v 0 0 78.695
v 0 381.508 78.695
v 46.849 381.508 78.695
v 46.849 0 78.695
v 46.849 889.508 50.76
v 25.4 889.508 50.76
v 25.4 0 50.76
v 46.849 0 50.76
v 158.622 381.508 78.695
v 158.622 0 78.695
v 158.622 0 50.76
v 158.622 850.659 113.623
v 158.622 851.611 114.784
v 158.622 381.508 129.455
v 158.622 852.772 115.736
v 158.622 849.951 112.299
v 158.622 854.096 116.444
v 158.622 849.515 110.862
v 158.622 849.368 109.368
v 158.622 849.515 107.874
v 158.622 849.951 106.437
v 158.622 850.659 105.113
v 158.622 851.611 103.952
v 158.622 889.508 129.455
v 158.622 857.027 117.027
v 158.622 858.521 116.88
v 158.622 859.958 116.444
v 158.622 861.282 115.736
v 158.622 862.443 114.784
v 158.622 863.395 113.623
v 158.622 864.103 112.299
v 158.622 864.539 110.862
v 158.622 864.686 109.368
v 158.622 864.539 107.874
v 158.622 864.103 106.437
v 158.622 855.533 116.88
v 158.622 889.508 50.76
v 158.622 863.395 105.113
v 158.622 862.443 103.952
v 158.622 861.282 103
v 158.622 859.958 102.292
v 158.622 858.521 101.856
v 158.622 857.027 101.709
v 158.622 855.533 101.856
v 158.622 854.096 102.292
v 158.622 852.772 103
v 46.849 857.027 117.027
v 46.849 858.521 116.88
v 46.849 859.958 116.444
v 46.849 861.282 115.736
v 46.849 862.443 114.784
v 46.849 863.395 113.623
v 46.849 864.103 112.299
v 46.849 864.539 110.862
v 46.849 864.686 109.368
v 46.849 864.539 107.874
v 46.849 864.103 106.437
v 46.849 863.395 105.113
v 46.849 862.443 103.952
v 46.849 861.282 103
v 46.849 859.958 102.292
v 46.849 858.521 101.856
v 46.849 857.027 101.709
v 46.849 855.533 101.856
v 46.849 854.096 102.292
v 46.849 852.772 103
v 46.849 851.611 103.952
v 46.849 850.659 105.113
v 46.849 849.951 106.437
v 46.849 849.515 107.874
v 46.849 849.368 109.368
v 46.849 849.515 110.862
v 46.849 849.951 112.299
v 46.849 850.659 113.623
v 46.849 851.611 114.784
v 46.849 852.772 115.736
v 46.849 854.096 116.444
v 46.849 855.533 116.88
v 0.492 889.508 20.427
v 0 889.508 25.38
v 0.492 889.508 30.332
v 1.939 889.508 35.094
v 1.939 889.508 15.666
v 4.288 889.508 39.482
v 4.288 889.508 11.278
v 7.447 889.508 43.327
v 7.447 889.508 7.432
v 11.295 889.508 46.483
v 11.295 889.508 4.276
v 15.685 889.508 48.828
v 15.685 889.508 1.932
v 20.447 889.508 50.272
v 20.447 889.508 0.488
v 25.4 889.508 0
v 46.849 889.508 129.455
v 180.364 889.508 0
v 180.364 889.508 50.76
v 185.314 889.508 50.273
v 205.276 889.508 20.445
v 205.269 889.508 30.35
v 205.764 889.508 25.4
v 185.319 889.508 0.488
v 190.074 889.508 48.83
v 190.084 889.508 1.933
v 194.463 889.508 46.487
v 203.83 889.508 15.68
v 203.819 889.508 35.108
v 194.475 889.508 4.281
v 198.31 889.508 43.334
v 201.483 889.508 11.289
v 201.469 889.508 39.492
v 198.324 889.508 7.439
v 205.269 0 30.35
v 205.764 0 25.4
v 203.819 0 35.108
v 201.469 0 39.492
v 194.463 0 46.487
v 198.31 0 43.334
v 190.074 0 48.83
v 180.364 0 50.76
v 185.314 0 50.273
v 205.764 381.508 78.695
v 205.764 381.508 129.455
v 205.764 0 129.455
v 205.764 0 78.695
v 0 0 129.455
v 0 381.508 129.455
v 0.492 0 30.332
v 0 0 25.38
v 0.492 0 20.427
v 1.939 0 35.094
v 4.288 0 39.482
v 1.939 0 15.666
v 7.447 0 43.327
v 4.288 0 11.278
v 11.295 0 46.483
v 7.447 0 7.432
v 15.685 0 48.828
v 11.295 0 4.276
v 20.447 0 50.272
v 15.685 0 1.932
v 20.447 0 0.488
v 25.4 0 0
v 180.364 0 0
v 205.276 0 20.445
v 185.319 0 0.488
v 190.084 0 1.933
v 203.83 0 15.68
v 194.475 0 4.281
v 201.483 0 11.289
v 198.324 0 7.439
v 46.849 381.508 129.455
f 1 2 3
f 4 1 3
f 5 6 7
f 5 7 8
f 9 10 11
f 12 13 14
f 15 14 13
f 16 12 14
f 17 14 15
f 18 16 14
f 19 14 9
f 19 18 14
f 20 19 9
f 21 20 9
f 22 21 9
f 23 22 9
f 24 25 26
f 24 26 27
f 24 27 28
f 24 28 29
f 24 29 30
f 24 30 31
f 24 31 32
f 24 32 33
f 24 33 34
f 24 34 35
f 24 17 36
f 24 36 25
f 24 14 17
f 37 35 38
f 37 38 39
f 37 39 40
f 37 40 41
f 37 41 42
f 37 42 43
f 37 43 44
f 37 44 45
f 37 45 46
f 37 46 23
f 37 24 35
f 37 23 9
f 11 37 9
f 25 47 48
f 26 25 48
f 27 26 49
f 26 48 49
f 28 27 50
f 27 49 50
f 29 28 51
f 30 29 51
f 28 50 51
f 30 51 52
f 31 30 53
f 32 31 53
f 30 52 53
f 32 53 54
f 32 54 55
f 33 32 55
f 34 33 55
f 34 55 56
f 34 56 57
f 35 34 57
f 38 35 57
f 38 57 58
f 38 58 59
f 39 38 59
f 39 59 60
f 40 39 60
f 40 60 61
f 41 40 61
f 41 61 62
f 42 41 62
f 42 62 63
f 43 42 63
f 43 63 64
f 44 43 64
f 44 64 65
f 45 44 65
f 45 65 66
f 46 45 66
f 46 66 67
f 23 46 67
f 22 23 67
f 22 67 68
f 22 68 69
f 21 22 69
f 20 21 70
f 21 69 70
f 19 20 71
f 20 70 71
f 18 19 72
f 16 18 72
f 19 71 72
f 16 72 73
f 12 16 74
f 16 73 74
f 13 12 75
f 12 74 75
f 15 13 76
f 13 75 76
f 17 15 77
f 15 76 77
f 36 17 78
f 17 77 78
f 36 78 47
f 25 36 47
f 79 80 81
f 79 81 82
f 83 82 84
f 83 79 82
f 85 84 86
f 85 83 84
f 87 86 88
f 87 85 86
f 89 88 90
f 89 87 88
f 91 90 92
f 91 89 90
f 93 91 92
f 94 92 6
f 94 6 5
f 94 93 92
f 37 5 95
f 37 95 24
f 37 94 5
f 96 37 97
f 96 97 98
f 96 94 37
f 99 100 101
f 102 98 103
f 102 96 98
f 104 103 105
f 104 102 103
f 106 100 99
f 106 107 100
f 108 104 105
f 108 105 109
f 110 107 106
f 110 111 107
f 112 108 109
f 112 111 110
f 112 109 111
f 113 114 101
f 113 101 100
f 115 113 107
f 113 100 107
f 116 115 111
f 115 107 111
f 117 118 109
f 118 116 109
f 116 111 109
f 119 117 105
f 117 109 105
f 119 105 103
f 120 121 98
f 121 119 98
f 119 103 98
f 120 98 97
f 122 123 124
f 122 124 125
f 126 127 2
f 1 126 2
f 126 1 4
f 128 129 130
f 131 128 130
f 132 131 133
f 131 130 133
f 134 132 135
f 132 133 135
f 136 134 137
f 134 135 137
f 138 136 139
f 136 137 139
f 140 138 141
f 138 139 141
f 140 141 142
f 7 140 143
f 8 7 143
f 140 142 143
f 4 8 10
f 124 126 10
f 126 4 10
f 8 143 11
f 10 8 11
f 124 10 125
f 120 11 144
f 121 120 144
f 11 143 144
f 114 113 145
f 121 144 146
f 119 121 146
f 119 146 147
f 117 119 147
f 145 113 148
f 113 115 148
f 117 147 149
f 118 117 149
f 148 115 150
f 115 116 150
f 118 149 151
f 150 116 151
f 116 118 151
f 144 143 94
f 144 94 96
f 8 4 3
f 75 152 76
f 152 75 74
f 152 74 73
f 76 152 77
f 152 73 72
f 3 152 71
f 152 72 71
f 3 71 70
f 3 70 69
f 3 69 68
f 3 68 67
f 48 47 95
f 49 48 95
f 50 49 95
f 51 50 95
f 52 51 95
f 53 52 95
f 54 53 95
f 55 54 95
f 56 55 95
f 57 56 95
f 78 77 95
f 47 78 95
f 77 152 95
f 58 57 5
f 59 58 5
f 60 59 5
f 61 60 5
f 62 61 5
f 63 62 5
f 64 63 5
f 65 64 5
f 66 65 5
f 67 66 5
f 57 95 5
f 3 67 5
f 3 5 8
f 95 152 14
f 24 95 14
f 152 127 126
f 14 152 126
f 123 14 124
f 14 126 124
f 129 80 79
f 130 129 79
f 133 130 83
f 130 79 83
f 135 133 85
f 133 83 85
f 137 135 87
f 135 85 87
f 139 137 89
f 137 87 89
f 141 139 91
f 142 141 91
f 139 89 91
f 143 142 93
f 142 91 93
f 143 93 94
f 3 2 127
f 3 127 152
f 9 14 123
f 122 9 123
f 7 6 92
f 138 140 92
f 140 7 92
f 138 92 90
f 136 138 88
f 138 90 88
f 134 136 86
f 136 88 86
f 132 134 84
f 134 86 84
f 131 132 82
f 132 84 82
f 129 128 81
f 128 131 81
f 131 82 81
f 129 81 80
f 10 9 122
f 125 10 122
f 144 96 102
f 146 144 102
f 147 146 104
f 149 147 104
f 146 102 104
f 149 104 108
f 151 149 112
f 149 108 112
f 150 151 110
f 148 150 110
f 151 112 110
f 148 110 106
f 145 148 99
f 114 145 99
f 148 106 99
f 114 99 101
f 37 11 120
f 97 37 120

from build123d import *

# Parameters (mm, degrees)
SKETCH1_W           = 205.763637231
SKETCH1_H           = 129.455055738
BOSS_EXTRUDE1_DEPTH = 889.508
SKETCH2_W           = 34.228088198
SKETCH2_H           = 27.935874949
CUT_EXTRUDE1_DEPTH  = 1151.636
SKETCH3_W           = 34.228088198
SKETCH3_H           = 27.935874949
CUT_EXTRUDE2_DEPTH  = 1331.214
FILLET3_R           = 25.4
FILLET4_R           = 25.4
FILLET5_R           = 25.4
FILLET7_R           = 25.4
SKETCH4_W           = 12.650207524
SKETCH4_H           = 27.935874949
BOSS_EXTRUDE3_DEPTH = 874.268
SKETCH5_W           = 12.621373824
SKETCH5_H           = 27.935874949
CUT_EXTRUDE5_DEPTH  = 1063.752
SKETCH6_W           = 12.913753515
SKETCH6_H           = 27.935874949
CUT_EXTRUDE6_DEPTH  = 1244.346
SKETCH8_W           = 46.849462022
SKETCH8_H           = 50.759590395
CUT_EXTRUDE7_DEPTH  = 508
SKETCH9_W           = 47.141841713
SKETCH9_H           = 50.759590395
CUT_EXTRUDE8_DEPTH  = 508
SKETCH10_R          = 7.658892277
CUT_EXTRUDE9_DEPTH  = 263.652


with BuildPart() as part:
    # Sketch1 → Boss-Extrude1 (new body)
    with BuildSketch(Plane(origin=(0, 0, 0), x_dir=(1, 0, 0), z_dir=(0, 1, 0))):
        with Locations((102.881818616, -64.727527869)):
            Rectangle(SKETCH1_W, SKETCH1_H)
    extrude(amount=BOSS_EXTRUDE1_DEPTH)

    # Sketch2 → Cut-Extrude1 (cut)
    with BuildSketch(Plane(origin=(0, 889.508, 0), x_dir=(1, 0, 0), z_dir=(0, 1, 0))):
        with Locations((17.114044099, -64.727527869)):
            Rectangle(SKETCH2_W, SKETCH2_H)
    extrude(amount=-CUT_EXTRUDE1_DEPTH, mode=Mode.SUBTRACT)

    # Sketch3 → Cut-Extrude2 (cut)
    with BuildSketch(Plane(origin=(0, 889.508, 0), x_dir=(1, 0, 0), z_dir=(0, 1, 0))):
        with Locations((188.649593132, -64.727527869)):
            Rectangle(SKETCH3_W, SKETCH3_H)
    extrude(amount=-CUT_EXTRUDE2_DEPTH, mode=Mode.SUBTRACT)

    # Fillet3
    fillet3_edges = [part.edges().sort_by_distance(p)[0] for p in [
        (0, 444.754, 0),
    ]]
    fillet(fillet3_edges, radius=FILLET3_R)

    # Fillet4
    fillet4_edges = [part.edges().sort_by_distance(p)[0] for p in [
        (205.763637231, 444.754, 0),
    ]]
    fillet(fillet4_edges, radius=FILLET4_R)

    # Fillet5
    # the kernel refuses this fillet: 25.4 mm, written as the material it takes off along each edge
    with BuildSketch(Plane(origin=(205.763637231, 953.008, 50.759590394), x_dir=(0, 0, -1), z_dir=(0, -1, 0))) as fillet5_piece_1:
        with BuildLine():
            CenterArc((FILLET5_R, -FILLET5_R), FILLET5_R, 90, 90)
            Line((0, -FILLET5_R), (0, 0))
            Line((0, 0), (FILLET5_R, 0))
        make_face()
    extrude(amount=1016.508, mode=Mode.SUBTRACT)

    # Fillet7
    # the kernel refuses this fillet: 25.4 mm, written as the material it takes off along each edge
    with BuildSketch(Plane(origin=(0, 953.008, 50.759590394), x_dir=(0, 0, -1), z_dir=(0, -1, 0))) as fillet7_piece_1:
        with BuildLine():
            CenterArc((FILLET7_R, FILLET7_R), FILLET7_R, 180, 90)
            Line((0, FILLET7_R), (0, 0))
            Line((0, 0), (FILLET7_R, 0))
        make_face()
    extrude(amount=1016.508, mode=Mode.SUBTRACT)

    # Sketch4 → Boss-Extrude3 (add)
    with BuildSketch(Plane(origin=(0, 889.508, 0), x_dir=(1, 0, 0), z_dir=(0, 1, 0))):
        with Locations((40.55319196, -64.727527869)):
            Rectangle(SKETCH4_W, SKETCH4_H)
    extrude(amount=-BOSS_EXTRUDE3_DEPTH)

    # Sketch5 → Cut-Extrude5 (cut)
    with BuildSketch(Plane(origin=(0, 889.508, 0), x_dir=(1, 0, 0), z_dir=(0, 1, 0))):
        with Locations((40.53877511, -64.727527869)):
            Rectangle(SKETCH5_W, SKETCH5_H)
    extrude(amount=-CUT_EXTRUDE5_DEPTH, mode=Mode.SUBTRACT)

    # Sketch6 → Cut-Extrude6 (cut)
    with BuildSketch(Plane(origin=(0, 889.508, 0), x_dir=(1, 0, 0), z_dir=(0, 1, 0))):
        with Locations((165.078672276, -64.727527869)):
            Rectangle(SKETCH6_W, SKETCH6_H)
    extrude(amount=-CUT_EXTRUDE6_DEPTH, mode=Mode.SUBTRACT)

    # Sketch8 → Cut-Extrude7 (cut)
    with BuildSketch(Plane(origin=(0, 889.508, 0), x_dir=(1, 0, 0), z_dir=(0, 1, 0))):
        with Locations((23.424731011, -104.075260541)):
            Rectangle(SKETCH8_W, SKETCH8_H)
    extrude(amount=-CUT_EXTRUDE7_DEPTH, mode=Mode.SUBTRACT)

    # Sketch9 → Cut-Extrude8 (cut)
    with BuildSketch(Plane(origin=(0, 889.508, 0), x_dir=(1, 0, 0), z_dir=(0, 1, 0))):
        with Locations((182.192716375, -104.075260541)):
            Rectangle(SKETCH9_W, SKETCH9_H)
    extrude(amount=-CUT_EXTRUDE8_DEPTH, mode=Mode.SUBTRACT)

    # Sketch10 → Cut-Extrude9 (cut)
    with BuildSketch(Plane.ZY.offset(-46.849462022)):
        with Locations((109.367874663, 857.026947913)):
            Circle(SKETCH10_R)
    extrude(amount=-CUT_EXTRUDE9_DEPTH, mode=Mode.SUBTRACT)


solid = part.part
